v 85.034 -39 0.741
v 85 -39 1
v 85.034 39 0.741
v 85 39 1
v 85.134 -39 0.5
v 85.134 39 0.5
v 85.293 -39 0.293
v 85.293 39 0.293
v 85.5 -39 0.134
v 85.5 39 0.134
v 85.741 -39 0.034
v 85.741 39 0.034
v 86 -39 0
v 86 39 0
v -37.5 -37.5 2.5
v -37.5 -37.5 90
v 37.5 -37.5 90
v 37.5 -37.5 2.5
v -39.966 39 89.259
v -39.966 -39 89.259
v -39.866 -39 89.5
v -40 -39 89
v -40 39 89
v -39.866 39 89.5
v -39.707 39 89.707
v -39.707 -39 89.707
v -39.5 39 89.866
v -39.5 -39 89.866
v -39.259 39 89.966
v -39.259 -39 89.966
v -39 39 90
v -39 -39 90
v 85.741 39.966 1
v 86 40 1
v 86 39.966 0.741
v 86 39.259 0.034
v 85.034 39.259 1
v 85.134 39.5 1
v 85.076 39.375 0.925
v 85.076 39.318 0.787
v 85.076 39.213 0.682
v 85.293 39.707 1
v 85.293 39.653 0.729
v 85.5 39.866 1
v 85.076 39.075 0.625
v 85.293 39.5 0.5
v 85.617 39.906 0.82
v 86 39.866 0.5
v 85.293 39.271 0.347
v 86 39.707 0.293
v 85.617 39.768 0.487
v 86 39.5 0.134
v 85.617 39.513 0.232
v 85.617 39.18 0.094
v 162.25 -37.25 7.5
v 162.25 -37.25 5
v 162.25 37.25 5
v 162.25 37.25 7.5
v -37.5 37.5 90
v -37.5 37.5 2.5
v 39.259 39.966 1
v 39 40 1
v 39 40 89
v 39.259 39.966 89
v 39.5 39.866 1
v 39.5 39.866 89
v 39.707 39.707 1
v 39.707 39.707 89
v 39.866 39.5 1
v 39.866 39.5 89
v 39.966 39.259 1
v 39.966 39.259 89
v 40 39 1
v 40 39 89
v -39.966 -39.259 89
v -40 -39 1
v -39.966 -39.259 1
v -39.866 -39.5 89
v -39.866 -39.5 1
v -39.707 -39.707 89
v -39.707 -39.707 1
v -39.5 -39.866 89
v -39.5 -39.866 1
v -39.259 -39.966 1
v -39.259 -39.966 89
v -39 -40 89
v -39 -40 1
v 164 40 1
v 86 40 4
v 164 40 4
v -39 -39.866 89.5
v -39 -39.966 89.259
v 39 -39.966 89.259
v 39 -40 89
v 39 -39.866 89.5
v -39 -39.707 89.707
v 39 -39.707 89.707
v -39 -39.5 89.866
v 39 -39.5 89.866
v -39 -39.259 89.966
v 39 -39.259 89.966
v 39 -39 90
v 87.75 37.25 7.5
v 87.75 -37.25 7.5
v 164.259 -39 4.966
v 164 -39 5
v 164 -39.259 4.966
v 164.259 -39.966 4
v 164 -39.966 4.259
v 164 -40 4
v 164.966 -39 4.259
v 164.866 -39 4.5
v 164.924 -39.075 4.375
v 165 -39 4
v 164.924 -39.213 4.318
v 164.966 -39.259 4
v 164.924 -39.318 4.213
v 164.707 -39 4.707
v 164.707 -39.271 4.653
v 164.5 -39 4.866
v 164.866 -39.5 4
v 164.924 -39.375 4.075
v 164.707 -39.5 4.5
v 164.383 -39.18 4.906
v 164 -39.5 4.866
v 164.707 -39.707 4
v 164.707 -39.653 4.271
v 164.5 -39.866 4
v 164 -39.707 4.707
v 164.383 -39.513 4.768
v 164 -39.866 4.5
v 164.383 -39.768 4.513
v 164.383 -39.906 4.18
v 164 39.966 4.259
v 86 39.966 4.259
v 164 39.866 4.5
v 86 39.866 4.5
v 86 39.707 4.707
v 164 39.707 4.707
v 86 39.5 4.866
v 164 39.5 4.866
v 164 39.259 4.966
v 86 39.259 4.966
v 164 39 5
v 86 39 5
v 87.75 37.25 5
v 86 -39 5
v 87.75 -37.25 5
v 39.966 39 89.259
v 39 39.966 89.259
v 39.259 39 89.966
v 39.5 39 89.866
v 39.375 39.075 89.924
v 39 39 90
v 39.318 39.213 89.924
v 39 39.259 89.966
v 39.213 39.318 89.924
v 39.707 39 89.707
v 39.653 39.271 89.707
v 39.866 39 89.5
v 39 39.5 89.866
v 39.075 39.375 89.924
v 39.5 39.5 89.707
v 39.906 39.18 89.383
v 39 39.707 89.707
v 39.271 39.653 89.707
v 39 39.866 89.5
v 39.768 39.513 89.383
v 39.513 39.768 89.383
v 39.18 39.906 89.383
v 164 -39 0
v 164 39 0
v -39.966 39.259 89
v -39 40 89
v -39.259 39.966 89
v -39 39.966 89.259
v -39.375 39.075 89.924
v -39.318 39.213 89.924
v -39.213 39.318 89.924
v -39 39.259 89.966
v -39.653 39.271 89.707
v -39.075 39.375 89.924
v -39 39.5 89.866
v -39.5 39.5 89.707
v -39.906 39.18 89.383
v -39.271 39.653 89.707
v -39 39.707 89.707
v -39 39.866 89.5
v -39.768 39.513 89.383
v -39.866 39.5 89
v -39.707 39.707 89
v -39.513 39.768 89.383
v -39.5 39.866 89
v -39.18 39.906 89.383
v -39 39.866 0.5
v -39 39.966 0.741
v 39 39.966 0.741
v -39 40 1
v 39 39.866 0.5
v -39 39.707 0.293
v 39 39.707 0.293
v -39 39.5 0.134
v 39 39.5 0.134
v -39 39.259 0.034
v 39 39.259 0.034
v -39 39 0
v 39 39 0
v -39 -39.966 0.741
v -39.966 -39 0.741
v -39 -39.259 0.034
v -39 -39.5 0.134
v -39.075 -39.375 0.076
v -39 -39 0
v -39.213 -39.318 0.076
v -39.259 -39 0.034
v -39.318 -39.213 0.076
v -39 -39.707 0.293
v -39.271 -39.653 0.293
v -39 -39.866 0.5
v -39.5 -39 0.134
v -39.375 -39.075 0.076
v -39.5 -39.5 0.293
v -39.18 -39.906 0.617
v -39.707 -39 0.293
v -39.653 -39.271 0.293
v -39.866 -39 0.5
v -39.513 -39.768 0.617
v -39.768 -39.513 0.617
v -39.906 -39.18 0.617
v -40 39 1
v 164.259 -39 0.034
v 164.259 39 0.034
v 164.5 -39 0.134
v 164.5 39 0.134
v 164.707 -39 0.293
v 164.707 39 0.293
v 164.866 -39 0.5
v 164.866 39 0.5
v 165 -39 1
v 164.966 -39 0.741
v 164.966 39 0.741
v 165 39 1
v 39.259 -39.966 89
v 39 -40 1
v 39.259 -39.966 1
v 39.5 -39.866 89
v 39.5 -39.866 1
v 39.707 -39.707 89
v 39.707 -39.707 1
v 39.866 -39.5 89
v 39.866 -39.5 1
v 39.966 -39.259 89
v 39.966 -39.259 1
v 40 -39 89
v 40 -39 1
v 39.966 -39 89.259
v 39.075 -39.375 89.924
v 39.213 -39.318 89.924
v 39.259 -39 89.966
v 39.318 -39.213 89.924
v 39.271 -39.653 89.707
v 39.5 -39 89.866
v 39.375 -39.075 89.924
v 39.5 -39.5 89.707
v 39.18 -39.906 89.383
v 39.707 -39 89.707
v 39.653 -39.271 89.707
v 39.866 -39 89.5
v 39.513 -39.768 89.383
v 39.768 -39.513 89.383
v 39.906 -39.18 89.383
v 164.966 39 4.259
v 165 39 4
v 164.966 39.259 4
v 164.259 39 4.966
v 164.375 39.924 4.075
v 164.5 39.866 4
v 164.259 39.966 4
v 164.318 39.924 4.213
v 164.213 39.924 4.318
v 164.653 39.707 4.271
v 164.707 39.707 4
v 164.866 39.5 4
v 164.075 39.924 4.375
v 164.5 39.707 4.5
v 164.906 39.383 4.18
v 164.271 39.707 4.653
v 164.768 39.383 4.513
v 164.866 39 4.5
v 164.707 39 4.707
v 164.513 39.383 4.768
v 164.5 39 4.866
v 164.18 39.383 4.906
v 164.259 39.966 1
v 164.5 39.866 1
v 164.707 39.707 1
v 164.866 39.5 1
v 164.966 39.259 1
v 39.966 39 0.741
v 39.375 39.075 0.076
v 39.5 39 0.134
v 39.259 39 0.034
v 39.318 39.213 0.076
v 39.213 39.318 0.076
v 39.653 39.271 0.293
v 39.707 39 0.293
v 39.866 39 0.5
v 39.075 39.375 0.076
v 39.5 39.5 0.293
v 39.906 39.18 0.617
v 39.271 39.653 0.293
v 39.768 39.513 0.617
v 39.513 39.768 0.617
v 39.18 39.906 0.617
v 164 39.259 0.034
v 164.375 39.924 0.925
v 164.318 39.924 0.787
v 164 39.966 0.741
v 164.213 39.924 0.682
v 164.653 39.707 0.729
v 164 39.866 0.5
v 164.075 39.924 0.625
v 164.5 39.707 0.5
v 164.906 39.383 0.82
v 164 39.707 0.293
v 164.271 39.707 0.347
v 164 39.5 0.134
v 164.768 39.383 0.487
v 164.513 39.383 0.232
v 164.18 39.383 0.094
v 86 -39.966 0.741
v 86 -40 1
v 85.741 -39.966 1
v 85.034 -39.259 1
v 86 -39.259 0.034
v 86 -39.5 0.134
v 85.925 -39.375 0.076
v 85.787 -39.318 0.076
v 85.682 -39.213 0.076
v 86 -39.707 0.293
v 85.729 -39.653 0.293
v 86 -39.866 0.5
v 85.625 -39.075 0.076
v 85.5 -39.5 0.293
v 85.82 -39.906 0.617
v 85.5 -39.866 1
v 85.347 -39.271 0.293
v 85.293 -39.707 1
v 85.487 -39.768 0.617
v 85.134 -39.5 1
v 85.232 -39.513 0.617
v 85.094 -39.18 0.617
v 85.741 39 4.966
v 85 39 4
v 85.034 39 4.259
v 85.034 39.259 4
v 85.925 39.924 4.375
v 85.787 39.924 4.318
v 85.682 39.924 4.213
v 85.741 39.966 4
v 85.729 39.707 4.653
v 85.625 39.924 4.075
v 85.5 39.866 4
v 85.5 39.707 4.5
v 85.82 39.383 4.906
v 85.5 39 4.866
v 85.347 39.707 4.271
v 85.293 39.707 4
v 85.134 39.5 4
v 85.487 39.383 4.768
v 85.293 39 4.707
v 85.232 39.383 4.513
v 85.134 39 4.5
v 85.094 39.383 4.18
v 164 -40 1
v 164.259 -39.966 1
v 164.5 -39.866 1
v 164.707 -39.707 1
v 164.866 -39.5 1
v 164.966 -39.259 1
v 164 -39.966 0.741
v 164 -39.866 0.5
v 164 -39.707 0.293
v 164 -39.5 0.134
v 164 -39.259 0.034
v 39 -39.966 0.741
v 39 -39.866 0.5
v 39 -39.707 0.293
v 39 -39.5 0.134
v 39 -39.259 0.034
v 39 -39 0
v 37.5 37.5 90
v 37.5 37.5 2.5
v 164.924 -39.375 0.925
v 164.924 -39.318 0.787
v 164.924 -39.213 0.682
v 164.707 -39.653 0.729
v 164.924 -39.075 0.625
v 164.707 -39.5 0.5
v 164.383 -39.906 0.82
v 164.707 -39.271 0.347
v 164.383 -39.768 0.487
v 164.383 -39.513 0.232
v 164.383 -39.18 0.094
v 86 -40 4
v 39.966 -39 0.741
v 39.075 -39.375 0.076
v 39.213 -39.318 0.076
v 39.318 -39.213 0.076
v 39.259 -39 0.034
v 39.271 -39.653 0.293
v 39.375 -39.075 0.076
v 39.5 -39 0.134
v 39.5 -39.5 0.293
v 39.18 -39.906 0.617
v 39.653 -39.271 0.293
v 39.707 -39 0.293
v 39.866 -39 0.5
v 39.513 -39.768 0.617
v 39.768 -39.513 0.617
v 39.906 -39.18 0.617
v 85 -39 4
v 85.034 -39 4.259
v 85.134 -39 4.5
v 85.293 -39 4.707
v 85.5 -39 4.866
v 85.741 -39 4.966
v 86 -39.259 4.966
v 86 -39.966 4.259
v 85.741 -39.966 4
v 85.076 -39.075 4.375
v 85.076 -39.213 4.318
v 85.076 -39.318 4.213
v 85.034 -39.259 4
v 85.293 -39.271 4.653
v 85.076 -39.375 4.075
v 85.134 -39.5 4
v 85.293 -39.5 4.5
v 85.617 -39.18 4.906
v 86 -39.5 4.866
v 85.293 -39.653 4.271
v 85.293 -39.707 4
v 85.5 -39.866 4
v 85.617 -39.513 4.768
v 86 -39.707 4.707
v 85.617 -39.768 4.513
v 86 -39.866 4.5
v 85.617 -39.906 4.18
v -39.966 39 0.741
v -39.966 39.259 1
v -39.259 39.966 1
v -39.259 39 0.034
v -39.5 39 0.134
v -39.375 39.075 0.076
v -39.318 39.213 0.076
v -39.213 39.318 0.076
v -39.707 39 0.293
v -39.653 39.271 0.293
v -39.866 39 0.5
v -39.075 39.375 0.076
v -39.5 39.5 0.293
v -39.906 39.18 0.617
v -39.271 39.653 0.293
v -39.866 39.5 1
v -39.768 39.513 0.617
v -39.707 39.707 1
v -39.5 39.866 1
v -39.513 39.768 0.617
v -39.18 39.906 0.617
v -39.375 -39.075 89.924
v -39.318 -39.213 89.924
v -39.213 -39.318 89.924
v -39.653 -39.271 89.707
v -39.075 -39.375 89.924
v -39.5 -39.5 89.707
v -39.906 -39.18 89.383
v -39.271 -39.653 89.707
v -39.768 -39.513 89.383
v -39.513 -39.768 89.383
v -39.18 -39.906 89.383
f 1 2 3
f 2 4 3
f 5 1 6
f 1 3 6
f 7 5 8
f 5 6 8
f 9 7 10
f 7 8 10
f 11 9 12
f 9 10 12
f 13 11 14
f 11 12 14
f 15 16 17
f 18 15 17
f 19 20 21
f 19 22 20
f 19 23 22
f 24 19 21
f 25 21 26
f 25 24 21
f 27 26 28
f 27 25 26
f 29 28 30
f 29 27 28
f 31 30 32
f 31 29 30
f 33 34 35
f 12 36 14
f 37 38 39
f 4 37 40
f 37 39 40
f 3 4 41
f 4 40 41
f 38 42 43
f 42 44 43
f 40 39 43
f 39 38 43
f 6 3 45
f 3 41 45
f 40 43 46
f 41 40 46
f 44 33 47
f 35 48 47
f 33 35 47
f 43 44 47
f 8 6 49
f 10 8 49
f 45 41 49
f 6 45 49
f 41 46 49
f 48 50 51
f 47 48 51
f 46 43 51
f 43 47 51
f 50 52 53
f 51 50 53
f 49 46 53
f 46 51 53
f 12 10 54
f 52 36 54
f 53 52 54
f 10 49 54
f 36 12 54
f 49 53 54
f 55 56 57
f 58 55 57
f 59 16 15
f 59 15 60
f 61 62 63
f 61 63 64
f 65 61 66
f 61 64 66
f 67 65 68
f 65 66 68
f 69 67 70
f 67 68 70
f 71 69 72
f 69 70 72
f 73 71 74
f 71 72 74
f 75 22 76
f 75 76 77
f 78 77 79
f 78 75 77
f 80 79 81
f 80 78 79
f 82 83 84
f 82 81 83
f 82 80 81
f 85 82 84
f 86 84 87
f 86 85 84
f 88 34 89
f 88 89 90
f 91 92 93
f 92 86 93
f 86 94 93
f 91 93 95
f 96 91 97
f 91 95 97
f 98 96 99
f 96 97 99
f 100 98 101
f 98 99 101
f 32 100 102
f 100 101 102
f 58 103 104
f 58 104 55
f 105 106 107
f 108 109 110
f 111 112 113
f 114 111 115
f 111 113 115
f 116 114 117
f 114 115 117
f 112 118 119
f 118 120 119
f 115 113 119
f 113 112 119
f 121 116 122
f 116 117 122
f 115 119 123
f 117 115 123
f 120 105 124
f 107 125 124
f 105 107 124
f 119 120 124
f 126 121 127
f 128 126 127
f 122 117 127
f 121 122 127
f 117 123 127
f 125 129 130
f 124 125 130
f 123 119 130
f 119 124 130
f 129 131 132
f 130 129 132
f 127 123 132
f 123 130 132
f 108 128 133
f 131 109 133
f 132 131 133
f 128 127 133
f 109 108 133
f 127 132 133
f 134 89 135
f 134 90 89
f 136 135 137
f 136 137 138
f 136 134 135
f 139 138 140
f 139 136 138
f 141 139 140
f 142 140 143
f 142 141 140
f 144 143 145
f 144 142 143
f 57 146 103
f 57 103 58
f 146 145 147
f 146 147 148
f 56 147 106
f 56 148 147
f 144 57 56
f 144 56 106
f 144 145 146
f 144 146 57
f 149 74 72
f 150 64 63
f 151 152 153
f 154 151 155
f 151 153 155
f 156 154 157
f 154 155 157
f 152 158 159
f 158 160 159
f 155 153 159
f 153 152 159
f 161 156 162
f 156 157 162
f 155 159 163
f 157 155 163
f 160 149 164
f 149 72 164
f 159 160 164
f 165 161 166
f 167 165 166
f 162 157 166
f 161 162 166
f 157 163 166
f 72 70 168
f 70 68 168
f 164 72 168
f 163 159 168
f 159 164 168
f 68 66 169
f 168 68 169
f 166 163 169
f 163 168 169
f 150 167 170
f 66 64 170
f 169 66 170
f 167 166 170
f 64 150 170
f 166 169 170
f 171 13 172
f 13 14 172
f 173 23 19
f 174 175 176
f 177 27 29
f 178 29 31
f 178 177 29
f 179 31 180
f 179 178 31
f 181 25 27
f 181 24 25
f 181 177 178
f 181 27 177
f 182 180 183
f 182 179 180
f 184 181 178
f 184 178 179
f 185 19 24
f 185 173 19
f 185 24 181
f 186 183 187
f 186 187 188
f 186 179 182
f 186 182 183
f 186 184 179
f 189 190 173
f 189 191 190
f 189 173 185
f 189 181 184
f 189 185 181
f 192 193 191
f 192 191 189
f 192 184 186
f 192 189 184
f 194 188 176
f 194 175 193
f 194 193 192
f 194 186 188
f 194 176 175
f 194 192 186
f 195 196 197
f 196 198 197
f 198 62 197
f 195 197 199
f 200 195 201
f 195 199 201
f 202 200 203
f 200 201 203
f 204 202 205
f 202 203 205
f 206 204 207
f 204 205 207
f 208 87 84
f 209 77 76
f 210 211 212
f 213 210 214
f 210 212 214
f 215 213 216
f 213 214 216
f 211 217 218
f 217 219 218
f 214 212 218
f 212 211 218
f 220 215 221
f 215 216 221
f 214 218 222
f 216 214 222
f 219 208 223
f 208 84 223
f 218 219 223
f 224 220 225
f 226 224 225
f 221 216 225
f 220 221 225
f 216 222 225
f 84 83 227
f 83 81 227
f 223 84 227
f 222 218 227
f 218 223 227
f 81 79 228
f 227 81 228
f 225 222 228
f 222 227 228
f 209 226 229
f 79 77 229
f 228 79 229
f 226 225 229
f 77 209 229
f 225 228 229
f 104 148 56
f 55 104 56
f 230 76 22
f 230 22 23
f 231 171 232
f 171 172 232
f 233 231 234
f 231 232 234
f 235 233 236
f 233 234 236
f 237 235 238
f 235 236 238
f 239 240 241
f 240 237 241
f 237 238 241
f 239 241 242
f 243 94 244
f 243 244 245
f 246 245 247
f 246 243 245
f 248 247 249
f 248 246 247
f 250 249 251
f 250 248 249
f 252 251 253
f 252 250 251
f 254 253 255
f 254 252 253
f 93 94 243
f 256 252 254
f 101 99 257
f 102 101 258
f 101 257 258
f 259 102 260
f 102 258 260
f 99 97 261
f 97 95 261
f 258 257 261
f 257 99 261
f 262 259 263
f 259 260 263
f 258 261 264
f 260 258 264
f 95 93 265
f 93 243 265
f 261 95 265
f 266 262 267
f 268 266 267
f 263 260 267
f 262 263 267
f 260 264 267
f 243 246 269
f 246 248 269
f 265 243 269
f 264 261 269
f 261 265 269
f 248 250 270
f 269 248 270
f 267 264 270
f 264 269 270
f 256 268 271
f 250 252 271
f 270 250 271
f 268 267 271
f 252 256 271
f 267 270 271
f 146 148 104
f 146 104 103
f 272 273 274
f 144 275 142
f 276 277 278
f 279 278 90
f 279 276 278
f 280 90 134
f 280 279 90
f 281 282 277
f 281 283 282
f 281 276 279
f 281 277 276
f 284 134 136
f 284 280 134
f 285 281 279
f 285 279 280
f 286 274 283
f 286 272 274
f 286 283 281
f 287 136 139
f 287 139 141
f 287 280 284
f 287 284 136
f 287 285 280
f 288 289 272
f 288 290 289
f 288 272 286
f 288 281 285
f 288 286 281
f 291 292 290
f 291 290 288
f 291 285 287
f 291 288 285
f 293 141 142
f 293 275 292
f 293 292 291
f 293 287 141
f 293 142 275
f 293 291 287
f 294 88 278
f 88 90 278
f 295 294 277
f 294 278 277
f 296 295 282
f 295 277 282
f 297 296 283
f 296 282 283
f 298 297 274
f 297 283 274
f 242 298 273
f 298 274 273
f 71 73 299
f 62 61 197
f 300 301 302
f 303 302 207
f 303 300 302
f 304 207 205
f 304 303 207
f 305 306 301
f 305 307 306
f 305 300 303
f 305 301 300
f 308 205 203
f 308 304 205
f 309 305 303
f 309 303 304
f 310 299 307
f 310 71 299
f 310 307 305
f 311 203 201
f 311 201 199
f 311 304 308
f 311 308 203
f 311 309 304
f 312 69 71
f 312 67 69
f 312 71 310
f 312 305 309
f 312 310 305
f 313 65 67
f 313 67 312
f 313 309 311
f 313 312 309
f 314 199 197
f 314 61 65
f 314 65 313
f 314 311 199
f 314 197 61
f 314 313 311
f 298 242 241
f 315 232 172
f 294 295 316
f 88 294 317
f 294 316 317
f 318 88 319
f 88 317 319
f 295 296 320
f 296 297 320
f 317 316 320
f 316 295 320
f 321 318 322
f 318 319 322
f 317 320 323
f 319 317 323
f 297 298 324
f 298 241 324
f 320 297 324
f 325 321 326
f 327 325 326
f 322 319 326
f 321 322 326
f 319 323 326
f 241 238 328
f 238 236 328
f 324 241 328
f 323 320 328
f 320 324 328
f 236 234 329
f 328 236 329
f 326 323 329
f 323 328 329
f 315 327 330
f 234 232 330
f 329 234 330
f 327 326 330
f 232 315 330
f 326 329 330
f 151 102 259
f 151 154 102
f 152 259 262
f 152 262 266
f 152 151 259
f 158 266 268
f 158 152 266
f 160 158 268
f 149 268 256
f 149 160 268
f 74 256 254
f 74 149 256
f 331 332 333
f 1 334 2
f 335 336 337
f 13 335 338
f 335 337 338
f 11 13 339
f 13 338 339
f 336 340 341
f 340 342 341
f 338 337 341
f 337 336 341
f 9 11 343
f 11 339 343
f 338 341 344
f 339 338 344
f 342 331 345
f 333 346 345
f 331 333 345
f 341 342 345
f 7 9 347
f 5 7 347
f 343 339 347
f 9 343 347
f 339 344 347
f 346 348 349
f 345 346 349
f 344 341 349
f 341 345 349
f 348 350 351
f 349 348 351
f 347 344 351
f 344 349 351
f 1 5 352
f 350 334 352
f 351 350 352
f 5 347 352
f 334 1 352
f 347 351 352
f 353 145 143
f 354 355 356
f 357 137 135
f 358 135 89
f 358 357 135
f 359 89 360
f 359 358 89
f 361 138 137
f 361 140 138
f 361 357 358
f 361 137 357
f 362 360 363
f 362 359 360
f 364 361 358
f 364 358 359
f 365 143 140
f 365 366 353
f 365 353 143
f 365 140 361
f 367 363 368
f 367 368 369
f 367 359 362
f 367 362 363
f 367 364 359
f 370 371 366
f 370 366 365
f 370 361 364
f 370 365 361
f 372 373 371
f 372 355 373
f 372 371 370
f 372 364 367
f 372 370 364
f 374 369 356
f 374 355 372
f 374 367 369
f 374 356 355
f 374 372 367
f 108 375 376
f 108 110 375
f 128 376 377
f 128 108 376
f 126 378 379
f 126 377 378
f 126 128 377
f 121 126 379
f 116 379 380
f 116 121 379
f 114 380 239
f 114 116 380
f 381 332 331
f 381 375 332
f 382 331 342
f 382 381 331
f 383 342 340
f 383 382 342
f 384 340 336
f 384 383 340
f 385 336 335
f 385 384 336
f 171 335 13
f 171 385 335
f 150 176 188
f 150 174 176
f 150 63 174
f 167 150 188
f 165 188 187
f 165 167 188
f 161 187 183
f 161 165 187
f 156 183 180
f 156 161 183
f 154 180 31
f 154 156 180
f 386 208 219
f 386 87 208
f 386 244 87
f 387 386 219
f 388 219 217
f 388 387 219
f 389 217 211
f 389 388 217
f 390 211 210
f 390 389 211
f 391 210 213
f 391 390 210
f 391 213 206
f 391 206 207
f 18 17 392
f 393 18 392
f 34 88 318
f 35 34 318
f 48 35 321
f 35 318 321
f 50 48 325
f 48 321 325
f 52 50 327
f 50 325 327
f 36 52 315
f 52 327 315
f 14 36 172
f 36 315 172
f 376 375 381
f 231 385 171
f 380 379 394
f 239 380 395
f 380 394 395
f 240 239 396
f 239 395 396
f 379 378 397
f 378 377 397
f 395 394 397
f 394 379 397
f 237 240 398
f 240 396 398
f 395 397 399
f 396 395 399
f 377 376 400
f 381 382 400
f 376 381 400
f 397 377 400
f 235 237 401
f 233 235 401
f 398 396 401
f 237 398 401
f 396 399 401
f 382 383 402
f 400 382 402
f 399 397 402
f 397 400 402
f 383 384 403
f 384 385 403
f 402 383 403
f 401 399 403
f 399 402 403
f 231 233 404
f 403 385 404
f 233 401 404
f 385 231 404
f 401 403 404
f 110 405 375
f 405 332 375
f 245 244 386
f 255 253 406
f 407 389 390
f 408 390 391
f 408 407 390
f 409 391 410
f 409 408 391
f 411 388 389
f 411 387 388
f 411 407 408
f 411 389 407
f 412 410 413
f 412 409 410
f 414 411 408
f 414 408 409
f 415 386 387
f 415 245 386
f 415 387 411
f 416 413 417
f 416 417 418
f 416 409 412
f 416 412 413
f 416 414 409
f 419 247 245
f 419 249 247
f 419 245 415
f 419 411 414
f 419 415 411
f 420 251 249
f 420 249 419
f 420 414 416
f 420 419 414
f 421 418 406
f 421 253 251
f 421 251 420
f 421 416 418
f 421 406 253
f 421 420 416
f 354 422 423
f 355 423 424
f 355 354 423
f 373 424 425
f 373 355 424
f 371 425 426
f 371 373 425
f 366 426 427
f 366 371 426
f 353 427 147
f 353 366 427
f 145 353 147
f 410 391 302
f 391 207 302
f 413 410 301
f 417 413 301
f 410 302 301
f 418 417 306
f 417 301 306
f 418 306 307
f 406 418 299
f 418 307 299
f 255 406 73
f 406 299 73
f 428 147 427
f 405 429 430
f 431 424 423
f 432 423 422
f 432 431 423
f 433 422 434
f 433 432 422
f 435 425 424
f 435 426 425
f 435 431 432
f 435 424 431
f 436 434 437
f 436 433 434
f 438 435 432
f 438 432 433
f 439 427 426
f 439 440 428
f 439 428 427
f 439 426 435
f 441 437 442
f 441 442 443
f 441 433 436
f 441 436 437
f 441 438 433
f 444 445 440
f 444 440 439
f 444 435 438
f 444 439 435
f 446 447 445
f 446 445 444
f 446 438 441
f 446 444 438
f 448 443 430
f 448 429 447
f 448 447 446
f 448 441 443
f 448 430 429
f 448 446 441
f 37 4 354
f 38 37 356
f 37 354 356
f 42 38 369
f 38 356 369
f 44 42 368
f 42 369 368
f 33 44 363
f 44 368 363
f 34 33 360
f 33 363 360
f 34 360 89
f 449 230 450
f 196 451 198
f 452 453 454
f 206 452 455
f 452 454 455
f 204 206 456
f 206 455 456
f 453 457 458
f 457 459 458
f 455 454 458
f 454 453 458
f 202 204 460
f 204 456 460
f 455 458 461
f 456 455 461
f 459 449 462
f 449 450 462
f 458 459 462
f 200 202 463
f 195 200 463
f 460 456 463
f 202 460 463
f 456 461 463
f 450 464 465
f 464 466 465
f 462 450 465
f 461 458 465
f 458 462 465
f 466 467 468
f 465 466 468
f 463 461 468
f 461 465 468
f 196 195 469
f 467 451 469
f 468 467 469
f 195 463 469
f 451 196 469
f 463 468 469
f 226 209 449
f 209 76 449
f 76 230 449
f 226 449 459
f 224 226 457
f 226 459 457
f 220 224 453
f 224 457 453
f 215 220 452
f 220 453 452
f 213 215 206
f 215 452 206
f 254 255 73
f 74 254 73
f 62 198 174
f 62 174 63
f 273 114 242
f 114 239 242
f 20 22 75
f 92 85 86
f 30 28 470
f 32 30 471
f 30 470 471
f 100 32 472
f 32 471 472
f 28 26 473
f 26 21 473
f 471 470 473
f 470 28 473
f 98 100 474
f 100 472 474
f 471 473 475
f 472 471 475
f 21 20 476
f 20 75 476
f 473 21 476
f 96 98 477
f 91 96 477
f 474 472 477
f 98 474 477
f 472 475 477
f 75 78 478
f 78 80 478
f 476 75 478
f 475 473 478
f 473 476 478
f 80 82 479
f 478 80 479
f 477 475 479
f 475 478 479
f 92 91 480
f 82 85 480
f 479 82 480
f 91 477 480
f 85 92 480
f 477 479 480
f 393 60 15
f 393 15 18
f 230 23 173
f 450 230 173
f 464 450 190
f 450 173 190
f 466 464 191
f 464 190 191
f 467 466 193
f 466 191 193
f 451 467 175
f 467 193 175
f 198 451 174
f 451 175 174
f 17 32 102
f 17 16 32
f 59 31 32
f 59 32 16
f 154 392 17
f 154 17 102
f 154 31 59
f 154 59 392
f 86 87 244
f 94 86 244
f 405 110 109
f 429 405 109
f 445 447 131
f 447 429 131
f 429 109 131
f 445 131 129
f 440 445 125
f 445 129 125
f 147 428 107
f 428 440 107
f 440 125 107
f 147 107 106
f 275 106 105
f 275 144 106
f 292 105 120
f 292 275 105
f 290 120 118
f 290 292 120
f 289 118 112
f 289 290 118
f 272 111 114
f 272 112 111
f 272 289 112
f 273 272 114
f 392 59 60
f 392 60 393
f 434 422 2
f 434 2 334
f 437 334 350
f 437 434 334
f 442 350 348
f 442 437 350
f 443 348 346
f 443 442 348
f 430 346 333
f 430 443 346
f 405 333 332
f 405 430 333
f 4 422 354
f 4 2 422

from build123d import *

# Parameters (mm, degrees)
SKETCH_W     = 80
SKETCH_H     = 80
PAD_DEPTH    = 90
SKETCH001_W  = 75
SKETCH001_H  = 75
POCKET_DEPTH = 87.5
FILLET_R     = 1
SKETCH002_W  = 80
SKETCH002_H  = 80
PAD001_DEPTH = 5
SKETCH003_W  = 74.5
SKETCH003_H  = 74.5
PAD002_DEPTH = 2.5
FILLET001_R  = 1


with BuildPart() as sgbbody:
    # Sketch → Pad (new body)
    with BuildSketch(Plane.XY):
        Rectangle(SKETCH_W, SKETCH_H)
    extrude(amount=PAD_DEPTH)

    # Sketch001 (on Face6 of Pad) → Pocket (cut)
    with BuildSketch(Plane.XY.offset(90)):
        Rectangle(SKETCH001_W, SKETCH001_H)
    extrude(amount=-POCKET_DEPTH, mode=Mode.SUBTRACT)

    # Fillet
    fillet_edges = [sgbbody.edges().sort_by_distance(p)[0] for p in [
        (-40, -40, 45),
        (40, -40, 45),
        (40, 40, 45),
        (-40, 40, 45),
        (0, -40, 0),
        (-40, 0, 0),
        (40, 0, 0),
        (0, 40, 0),
        (-40, 0, 90),
        (0, -40, 90),
        (40, 0, 90),
        (0, 40, 90),
    ]]
    fillet(fillet_edges, radius=FILLET_R)


with BuildPart() as sgbtop:
    # Sketch002 → Pad001 (new body)
    with BuildSketch(Plane.XY):
        with Locations((125, 0)):
            Rectangle(SKETCH002_W, SKETCH002_H)
    extrude(amount=PAD001_DEPTH)

    # Sketch003 (on Face6 of Pad001) → Pad002 (join)
    with BuildSketch(Plane.XY.offset(5)):
        with Locations((125, 0)):
            Rectangle(SKETCH003_W, SKETCH003_H)
    extrude(amount=PAD002_DEPTH)

    # Fillet001
    fillet001_edges = [sgbtop.edges().sort_by_distance(p)[0] for p in [
        (125, -40, 5),
        (85, 0, 5),
        (165, 0, 5),
        (85, -40, 2.5),
        (125, -40, 0),
        (165, -40, 2.5),
        (165, 0, 0),
        (165, 40, 2.5),
        (125, 40, 5),
        (125, 40, 0),
        (85, 40, 2.5),
        (85, 0, 0),
    ]]
    fillet(fillet001_edges, radius=FILLET001_R)


solid = Compound([sgbbody.part, sgbtop.part])
